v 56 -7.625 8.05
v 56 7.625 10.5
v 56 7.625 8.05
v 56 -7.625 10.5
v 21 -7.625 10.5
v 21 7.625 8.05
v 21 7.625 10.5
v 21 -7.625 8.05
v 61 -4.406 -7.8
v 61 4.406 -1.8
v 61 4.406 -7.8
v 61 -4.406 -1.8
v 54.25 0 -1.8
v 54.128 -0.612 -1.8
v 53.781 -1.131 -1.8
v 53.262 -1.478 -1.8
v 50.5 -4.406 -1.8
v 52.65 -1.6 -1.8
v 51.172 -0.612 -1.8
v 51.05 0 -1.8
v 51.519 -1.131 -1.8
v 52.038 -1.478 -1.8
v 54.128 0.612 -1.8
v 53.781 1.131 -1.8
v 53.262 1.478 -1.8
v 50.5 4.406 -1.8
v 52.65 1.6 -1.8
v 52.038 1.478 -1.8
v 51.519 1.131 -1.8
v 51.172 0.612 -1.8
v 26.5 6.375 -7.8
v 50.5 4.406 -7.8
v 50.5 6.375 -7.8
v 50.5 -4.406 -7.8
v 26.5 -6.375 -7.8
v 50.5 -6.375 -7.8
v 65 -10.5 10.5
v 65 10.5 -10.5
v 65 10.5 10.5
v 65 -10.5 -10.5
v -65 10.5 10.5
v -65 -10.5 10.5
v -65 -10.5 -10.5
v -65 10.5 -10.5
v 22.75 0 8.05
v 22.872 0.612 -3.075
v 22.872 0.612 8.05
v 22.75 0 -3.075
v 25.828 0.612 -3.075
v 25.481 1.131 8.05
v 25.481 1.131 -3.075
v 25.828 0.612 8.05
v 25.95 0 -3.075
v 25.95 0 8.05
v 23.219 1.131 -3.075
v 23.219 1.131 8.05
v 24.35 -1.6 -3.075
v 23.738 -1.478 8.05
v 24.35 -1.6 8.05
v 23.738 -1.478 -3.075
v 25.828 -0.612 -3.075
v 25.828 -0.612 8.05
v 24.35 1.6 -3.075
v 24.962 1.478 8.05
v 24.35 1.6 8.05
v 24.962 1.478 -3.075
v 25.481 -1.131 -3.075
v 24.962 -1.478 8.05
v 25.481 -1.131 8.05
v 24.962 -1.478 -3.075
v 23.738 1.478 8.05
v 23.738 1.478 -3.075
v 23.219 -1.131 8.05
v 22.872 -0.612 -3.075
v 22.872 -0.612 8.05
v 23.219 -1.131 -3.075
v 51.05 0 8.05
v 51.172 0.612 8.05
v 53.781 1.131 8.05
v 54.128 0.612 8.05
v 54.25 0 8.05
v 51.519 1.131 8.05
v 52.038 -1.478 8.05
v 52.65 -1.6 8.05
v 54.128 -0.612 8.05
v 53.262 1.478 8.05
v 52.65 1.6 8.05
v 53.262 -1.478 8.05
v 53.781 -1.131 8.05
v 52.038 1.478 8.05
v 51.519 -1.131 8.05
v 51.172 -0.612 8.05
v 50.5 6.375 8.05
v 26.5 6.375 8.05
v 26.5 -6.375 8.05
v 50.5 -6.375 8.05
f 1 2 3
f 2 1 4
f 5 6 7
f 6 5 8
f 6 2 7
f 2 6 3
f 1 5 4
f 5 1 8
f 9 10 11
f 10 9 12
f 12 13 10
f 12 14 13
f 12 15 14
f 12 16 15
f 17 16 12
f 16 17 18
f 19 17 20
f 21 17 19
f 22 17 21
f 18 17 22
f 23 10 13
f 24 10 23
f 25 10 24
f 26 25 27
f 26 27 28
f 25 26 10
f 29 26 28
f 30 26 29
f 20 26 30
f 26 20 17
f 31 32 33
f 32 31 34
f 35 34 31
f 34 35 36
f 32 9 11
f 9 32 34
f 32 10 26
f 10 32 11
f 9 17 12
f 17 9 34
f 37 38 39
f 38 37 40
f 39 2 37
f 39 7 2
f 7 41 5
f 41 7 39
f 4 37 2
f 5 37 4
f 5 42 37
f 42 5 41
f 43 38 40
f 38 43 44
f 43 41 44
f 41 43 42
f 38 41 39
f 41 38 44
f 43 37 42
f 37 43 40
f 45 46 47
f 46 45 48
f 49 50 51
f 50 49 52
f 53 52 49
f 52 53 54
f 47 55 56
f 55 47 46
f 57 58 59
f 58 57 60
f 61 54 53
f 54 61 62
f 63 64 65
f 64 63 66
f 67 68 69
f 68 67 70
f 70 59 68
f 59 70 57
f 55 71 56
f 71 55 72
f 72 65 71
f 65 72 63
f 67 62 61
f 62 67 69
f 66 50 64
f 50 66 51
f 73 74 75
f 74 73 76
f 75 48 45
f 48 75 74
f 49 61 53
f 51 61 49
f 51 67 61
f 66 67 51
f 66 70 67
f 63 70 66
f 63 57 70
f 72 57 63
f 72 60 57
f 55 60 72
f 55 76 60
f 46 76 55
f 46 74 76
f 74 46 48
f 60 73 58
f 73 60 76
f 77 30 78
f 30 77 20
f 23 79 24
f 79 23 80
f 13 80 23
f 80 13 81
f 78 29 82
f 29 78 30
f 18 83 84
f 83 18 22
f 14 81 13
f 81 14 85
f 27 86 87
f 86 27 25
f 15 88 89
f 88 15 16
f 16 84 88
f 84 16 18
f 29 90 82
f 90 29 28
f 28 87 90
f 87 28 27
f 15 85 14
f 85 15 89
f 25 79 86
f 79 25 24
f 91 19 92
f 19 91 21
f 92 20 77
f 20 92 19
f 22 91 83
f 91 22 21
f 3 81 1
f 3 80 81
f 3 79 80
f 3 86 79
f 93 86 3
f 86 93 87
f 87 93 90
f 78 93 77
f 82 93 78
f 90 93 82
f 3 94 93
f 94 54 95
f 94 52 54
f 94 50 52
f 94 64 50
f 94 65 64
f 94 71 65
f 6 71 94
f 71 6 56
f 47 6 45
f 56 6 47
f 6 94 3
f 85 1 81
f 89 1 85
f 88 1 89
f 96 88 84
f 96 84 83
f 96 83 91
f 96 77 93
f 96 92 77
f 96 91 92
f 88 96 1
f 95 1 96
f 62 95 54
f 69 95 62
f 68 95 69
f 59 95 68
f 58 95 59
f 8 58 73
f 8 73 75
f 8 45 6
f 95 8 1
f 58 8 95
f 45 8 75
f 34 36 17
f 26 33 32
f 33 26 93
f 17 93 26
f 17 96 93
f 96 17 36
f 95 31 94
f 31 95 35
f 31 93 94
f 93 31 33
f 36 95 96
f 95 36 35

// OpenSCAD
// file: servo.scad
$fn = 16;

function get_servo_box_size (size = [20,10,15], shaft_offset = 5, thickness = 1, screw_offset = 2, screw_radius = 0.75) = [[size[0]+(screw_radius+screw_offset+thickness)*2, size[1]+thickness*2, size[2]+thickness]];

module servo_box(size = [20,10,15], shaft_offset = 5, thickness = 1, screw_count = 1, screw_offset = 2, screw_radius = 0.75, screw_depth = 5, wire_exit_height = 6, wire_exit_width_frac = 3/4){
  tolerance = 0.5;
  //tollerance is 1.5X on X to help fitting and not on z

  servo_base = [size[0]+tolerance*3, size[1]+ tolerance *2, size[2]+thickness];
  servo_base_box = [size[0]+(screw_radius+screw_offset+thickness)*2, size[1]+thickness*2, size[2]+thickness];
  screw_separation = 2.5;

  //#translate([0,0,8])
  //#cube([2,2,8], center = true);

  
  translate([shaft_offset,0,0])
  difference(){  
    // box
    translate([0,0,-(thickness)/2])
    cube(servo_base_box, center = true);

    //base
    translate([0,0,(thickness+tolerance)/2])
    cube(servo_base, center = true);

    //wirehole
    translate([size[0]/2+(screw_radius+screw_offset+thickness)/2,0,-(size[2]-tolerance)/2 + wire_exit_height/2])
    cube([(thickness+screw_radius+screw_offset)*2, size[1]*wire_exit_width_frac, wire_exit_height], true);
    
    //screws
    if (screw_count == 1){
      translate([-(screw_offset+size[0]/2),0,servo_base[2]/2])
      cylinder(screw_depth*2, screw_radius, screw_radius, center = true);

      translate([(screw_offset+size[0]/2),0,servo_base[2]/2])
      cylinder(screw_depth*2, screw_radius, screw_radius, center = true);
    }
    if (screw_count == 2){   
      translate([(screw_offset+servo_base[0]/2),-screw_separation/2,servo_base[2]/2])
      cylinder(screw_depth*2, screw_radius, screw_radius, center = true);

      translate([(screw_offset+servo_base[0]/2),screw_separation/2,servo_base[2]/2])
      cylinder(screw_depth*2, screw_radius, screw_radius, center = true);

      translate([-(screw_offset+servo_base[0]/2),-screw_separation/2,servo_base[2]/2])
      cylinder(screw_depth*2, screw_radius, screw_radius, center = true);

      translate([-(screw_offset+servo_base[0]/2),screw_separation/2,servo_base[2]/2])
      cylinder(screw_depth*2, screw_radius, screw_radius, center = true);
    }
  }  
}

module servo_spacing(size = [20,10,15], shaft_offset = 5, shaft_height = 2,thickness = 1, screw_offset = 2, screw_radius = 0.75, wire_exit_height = 6, wire_exit_width_frac = 3/4, wire_exit_amount = 5){
  servo_base_box = [size[0]+(screw_radius+screw_offset+thickness)*2, size[1]+thickness*2, size[2]+thickness+shaft_height];
  translate([shaft_offset,0,0])
  union(){

    translate([0,0,-(thickness)/2+shaft_height/2])
    cube(servo_base_box, center = true);

    translate([size[0]/2+(screw_radius+screw_offset+thickness)+wire_exit_amount/2,0,-(size[2]-0.5)/2 + wire_exit_height/2])
    cube([wire_exit_amount, size[1]*wire_exit_width_frac, wire_exit_height], true);
  }
}

module servo_top(outer_radius = 50, hole_radius = 10){
 $fn = 8;
 cylinder(outer_radius, center = true);
}



//servo_box();
//servo_spacing();
//echo(get_servo_box_size());
// main file
use <servo.scad>

module box_container(size, thickness){
  translate([0,0,size[2]/2+thickness])
  difference(){
    cube([size[0]+2*thickness, size[1]+2*thickness, size[2]+2*thickness], center = true);
    translate([0,0,thickness*2])
    cube(size, center = true);
  }
}

//servo_top();

module arm_segment(arm_length, module_distance){
  width = 21;
  depth = 21;



  //StartModule
  //cube(15, center = true);

  //EndModule
  //translate([arm_length,0,0])
  //rotate([0,90,0])
  union(){
    difference(){
      cube([arm_length,width,depth], center = true);
      
      translate([module_distance/2,0,0])
      servo_spacing(size = [22.4+0.1, 11.75, 16.1],shaft_offset = 6, shaft_height = 3, thickness = 1.75, screw_offset = 2.9, screw_radius = 1.6, wire_exit_height = 6, wire_exit_width_frac = 3/4, wire_exit_amount = 5);

    }
    translate([module_distance/2,0,0])
    servo_box(size = [22.4+0.1, 11.75, 16.1],shaft_offset = 6, thickness = 1.75, screw_count = 1, screw_offset = 2.9, screw_radius = 1.6, screw_depth = 12, wire_exit_height = 6, wire_exit_width_frac = 3/4);

}
}

arm_segment(arm_length = 130, module_distance = 65);
